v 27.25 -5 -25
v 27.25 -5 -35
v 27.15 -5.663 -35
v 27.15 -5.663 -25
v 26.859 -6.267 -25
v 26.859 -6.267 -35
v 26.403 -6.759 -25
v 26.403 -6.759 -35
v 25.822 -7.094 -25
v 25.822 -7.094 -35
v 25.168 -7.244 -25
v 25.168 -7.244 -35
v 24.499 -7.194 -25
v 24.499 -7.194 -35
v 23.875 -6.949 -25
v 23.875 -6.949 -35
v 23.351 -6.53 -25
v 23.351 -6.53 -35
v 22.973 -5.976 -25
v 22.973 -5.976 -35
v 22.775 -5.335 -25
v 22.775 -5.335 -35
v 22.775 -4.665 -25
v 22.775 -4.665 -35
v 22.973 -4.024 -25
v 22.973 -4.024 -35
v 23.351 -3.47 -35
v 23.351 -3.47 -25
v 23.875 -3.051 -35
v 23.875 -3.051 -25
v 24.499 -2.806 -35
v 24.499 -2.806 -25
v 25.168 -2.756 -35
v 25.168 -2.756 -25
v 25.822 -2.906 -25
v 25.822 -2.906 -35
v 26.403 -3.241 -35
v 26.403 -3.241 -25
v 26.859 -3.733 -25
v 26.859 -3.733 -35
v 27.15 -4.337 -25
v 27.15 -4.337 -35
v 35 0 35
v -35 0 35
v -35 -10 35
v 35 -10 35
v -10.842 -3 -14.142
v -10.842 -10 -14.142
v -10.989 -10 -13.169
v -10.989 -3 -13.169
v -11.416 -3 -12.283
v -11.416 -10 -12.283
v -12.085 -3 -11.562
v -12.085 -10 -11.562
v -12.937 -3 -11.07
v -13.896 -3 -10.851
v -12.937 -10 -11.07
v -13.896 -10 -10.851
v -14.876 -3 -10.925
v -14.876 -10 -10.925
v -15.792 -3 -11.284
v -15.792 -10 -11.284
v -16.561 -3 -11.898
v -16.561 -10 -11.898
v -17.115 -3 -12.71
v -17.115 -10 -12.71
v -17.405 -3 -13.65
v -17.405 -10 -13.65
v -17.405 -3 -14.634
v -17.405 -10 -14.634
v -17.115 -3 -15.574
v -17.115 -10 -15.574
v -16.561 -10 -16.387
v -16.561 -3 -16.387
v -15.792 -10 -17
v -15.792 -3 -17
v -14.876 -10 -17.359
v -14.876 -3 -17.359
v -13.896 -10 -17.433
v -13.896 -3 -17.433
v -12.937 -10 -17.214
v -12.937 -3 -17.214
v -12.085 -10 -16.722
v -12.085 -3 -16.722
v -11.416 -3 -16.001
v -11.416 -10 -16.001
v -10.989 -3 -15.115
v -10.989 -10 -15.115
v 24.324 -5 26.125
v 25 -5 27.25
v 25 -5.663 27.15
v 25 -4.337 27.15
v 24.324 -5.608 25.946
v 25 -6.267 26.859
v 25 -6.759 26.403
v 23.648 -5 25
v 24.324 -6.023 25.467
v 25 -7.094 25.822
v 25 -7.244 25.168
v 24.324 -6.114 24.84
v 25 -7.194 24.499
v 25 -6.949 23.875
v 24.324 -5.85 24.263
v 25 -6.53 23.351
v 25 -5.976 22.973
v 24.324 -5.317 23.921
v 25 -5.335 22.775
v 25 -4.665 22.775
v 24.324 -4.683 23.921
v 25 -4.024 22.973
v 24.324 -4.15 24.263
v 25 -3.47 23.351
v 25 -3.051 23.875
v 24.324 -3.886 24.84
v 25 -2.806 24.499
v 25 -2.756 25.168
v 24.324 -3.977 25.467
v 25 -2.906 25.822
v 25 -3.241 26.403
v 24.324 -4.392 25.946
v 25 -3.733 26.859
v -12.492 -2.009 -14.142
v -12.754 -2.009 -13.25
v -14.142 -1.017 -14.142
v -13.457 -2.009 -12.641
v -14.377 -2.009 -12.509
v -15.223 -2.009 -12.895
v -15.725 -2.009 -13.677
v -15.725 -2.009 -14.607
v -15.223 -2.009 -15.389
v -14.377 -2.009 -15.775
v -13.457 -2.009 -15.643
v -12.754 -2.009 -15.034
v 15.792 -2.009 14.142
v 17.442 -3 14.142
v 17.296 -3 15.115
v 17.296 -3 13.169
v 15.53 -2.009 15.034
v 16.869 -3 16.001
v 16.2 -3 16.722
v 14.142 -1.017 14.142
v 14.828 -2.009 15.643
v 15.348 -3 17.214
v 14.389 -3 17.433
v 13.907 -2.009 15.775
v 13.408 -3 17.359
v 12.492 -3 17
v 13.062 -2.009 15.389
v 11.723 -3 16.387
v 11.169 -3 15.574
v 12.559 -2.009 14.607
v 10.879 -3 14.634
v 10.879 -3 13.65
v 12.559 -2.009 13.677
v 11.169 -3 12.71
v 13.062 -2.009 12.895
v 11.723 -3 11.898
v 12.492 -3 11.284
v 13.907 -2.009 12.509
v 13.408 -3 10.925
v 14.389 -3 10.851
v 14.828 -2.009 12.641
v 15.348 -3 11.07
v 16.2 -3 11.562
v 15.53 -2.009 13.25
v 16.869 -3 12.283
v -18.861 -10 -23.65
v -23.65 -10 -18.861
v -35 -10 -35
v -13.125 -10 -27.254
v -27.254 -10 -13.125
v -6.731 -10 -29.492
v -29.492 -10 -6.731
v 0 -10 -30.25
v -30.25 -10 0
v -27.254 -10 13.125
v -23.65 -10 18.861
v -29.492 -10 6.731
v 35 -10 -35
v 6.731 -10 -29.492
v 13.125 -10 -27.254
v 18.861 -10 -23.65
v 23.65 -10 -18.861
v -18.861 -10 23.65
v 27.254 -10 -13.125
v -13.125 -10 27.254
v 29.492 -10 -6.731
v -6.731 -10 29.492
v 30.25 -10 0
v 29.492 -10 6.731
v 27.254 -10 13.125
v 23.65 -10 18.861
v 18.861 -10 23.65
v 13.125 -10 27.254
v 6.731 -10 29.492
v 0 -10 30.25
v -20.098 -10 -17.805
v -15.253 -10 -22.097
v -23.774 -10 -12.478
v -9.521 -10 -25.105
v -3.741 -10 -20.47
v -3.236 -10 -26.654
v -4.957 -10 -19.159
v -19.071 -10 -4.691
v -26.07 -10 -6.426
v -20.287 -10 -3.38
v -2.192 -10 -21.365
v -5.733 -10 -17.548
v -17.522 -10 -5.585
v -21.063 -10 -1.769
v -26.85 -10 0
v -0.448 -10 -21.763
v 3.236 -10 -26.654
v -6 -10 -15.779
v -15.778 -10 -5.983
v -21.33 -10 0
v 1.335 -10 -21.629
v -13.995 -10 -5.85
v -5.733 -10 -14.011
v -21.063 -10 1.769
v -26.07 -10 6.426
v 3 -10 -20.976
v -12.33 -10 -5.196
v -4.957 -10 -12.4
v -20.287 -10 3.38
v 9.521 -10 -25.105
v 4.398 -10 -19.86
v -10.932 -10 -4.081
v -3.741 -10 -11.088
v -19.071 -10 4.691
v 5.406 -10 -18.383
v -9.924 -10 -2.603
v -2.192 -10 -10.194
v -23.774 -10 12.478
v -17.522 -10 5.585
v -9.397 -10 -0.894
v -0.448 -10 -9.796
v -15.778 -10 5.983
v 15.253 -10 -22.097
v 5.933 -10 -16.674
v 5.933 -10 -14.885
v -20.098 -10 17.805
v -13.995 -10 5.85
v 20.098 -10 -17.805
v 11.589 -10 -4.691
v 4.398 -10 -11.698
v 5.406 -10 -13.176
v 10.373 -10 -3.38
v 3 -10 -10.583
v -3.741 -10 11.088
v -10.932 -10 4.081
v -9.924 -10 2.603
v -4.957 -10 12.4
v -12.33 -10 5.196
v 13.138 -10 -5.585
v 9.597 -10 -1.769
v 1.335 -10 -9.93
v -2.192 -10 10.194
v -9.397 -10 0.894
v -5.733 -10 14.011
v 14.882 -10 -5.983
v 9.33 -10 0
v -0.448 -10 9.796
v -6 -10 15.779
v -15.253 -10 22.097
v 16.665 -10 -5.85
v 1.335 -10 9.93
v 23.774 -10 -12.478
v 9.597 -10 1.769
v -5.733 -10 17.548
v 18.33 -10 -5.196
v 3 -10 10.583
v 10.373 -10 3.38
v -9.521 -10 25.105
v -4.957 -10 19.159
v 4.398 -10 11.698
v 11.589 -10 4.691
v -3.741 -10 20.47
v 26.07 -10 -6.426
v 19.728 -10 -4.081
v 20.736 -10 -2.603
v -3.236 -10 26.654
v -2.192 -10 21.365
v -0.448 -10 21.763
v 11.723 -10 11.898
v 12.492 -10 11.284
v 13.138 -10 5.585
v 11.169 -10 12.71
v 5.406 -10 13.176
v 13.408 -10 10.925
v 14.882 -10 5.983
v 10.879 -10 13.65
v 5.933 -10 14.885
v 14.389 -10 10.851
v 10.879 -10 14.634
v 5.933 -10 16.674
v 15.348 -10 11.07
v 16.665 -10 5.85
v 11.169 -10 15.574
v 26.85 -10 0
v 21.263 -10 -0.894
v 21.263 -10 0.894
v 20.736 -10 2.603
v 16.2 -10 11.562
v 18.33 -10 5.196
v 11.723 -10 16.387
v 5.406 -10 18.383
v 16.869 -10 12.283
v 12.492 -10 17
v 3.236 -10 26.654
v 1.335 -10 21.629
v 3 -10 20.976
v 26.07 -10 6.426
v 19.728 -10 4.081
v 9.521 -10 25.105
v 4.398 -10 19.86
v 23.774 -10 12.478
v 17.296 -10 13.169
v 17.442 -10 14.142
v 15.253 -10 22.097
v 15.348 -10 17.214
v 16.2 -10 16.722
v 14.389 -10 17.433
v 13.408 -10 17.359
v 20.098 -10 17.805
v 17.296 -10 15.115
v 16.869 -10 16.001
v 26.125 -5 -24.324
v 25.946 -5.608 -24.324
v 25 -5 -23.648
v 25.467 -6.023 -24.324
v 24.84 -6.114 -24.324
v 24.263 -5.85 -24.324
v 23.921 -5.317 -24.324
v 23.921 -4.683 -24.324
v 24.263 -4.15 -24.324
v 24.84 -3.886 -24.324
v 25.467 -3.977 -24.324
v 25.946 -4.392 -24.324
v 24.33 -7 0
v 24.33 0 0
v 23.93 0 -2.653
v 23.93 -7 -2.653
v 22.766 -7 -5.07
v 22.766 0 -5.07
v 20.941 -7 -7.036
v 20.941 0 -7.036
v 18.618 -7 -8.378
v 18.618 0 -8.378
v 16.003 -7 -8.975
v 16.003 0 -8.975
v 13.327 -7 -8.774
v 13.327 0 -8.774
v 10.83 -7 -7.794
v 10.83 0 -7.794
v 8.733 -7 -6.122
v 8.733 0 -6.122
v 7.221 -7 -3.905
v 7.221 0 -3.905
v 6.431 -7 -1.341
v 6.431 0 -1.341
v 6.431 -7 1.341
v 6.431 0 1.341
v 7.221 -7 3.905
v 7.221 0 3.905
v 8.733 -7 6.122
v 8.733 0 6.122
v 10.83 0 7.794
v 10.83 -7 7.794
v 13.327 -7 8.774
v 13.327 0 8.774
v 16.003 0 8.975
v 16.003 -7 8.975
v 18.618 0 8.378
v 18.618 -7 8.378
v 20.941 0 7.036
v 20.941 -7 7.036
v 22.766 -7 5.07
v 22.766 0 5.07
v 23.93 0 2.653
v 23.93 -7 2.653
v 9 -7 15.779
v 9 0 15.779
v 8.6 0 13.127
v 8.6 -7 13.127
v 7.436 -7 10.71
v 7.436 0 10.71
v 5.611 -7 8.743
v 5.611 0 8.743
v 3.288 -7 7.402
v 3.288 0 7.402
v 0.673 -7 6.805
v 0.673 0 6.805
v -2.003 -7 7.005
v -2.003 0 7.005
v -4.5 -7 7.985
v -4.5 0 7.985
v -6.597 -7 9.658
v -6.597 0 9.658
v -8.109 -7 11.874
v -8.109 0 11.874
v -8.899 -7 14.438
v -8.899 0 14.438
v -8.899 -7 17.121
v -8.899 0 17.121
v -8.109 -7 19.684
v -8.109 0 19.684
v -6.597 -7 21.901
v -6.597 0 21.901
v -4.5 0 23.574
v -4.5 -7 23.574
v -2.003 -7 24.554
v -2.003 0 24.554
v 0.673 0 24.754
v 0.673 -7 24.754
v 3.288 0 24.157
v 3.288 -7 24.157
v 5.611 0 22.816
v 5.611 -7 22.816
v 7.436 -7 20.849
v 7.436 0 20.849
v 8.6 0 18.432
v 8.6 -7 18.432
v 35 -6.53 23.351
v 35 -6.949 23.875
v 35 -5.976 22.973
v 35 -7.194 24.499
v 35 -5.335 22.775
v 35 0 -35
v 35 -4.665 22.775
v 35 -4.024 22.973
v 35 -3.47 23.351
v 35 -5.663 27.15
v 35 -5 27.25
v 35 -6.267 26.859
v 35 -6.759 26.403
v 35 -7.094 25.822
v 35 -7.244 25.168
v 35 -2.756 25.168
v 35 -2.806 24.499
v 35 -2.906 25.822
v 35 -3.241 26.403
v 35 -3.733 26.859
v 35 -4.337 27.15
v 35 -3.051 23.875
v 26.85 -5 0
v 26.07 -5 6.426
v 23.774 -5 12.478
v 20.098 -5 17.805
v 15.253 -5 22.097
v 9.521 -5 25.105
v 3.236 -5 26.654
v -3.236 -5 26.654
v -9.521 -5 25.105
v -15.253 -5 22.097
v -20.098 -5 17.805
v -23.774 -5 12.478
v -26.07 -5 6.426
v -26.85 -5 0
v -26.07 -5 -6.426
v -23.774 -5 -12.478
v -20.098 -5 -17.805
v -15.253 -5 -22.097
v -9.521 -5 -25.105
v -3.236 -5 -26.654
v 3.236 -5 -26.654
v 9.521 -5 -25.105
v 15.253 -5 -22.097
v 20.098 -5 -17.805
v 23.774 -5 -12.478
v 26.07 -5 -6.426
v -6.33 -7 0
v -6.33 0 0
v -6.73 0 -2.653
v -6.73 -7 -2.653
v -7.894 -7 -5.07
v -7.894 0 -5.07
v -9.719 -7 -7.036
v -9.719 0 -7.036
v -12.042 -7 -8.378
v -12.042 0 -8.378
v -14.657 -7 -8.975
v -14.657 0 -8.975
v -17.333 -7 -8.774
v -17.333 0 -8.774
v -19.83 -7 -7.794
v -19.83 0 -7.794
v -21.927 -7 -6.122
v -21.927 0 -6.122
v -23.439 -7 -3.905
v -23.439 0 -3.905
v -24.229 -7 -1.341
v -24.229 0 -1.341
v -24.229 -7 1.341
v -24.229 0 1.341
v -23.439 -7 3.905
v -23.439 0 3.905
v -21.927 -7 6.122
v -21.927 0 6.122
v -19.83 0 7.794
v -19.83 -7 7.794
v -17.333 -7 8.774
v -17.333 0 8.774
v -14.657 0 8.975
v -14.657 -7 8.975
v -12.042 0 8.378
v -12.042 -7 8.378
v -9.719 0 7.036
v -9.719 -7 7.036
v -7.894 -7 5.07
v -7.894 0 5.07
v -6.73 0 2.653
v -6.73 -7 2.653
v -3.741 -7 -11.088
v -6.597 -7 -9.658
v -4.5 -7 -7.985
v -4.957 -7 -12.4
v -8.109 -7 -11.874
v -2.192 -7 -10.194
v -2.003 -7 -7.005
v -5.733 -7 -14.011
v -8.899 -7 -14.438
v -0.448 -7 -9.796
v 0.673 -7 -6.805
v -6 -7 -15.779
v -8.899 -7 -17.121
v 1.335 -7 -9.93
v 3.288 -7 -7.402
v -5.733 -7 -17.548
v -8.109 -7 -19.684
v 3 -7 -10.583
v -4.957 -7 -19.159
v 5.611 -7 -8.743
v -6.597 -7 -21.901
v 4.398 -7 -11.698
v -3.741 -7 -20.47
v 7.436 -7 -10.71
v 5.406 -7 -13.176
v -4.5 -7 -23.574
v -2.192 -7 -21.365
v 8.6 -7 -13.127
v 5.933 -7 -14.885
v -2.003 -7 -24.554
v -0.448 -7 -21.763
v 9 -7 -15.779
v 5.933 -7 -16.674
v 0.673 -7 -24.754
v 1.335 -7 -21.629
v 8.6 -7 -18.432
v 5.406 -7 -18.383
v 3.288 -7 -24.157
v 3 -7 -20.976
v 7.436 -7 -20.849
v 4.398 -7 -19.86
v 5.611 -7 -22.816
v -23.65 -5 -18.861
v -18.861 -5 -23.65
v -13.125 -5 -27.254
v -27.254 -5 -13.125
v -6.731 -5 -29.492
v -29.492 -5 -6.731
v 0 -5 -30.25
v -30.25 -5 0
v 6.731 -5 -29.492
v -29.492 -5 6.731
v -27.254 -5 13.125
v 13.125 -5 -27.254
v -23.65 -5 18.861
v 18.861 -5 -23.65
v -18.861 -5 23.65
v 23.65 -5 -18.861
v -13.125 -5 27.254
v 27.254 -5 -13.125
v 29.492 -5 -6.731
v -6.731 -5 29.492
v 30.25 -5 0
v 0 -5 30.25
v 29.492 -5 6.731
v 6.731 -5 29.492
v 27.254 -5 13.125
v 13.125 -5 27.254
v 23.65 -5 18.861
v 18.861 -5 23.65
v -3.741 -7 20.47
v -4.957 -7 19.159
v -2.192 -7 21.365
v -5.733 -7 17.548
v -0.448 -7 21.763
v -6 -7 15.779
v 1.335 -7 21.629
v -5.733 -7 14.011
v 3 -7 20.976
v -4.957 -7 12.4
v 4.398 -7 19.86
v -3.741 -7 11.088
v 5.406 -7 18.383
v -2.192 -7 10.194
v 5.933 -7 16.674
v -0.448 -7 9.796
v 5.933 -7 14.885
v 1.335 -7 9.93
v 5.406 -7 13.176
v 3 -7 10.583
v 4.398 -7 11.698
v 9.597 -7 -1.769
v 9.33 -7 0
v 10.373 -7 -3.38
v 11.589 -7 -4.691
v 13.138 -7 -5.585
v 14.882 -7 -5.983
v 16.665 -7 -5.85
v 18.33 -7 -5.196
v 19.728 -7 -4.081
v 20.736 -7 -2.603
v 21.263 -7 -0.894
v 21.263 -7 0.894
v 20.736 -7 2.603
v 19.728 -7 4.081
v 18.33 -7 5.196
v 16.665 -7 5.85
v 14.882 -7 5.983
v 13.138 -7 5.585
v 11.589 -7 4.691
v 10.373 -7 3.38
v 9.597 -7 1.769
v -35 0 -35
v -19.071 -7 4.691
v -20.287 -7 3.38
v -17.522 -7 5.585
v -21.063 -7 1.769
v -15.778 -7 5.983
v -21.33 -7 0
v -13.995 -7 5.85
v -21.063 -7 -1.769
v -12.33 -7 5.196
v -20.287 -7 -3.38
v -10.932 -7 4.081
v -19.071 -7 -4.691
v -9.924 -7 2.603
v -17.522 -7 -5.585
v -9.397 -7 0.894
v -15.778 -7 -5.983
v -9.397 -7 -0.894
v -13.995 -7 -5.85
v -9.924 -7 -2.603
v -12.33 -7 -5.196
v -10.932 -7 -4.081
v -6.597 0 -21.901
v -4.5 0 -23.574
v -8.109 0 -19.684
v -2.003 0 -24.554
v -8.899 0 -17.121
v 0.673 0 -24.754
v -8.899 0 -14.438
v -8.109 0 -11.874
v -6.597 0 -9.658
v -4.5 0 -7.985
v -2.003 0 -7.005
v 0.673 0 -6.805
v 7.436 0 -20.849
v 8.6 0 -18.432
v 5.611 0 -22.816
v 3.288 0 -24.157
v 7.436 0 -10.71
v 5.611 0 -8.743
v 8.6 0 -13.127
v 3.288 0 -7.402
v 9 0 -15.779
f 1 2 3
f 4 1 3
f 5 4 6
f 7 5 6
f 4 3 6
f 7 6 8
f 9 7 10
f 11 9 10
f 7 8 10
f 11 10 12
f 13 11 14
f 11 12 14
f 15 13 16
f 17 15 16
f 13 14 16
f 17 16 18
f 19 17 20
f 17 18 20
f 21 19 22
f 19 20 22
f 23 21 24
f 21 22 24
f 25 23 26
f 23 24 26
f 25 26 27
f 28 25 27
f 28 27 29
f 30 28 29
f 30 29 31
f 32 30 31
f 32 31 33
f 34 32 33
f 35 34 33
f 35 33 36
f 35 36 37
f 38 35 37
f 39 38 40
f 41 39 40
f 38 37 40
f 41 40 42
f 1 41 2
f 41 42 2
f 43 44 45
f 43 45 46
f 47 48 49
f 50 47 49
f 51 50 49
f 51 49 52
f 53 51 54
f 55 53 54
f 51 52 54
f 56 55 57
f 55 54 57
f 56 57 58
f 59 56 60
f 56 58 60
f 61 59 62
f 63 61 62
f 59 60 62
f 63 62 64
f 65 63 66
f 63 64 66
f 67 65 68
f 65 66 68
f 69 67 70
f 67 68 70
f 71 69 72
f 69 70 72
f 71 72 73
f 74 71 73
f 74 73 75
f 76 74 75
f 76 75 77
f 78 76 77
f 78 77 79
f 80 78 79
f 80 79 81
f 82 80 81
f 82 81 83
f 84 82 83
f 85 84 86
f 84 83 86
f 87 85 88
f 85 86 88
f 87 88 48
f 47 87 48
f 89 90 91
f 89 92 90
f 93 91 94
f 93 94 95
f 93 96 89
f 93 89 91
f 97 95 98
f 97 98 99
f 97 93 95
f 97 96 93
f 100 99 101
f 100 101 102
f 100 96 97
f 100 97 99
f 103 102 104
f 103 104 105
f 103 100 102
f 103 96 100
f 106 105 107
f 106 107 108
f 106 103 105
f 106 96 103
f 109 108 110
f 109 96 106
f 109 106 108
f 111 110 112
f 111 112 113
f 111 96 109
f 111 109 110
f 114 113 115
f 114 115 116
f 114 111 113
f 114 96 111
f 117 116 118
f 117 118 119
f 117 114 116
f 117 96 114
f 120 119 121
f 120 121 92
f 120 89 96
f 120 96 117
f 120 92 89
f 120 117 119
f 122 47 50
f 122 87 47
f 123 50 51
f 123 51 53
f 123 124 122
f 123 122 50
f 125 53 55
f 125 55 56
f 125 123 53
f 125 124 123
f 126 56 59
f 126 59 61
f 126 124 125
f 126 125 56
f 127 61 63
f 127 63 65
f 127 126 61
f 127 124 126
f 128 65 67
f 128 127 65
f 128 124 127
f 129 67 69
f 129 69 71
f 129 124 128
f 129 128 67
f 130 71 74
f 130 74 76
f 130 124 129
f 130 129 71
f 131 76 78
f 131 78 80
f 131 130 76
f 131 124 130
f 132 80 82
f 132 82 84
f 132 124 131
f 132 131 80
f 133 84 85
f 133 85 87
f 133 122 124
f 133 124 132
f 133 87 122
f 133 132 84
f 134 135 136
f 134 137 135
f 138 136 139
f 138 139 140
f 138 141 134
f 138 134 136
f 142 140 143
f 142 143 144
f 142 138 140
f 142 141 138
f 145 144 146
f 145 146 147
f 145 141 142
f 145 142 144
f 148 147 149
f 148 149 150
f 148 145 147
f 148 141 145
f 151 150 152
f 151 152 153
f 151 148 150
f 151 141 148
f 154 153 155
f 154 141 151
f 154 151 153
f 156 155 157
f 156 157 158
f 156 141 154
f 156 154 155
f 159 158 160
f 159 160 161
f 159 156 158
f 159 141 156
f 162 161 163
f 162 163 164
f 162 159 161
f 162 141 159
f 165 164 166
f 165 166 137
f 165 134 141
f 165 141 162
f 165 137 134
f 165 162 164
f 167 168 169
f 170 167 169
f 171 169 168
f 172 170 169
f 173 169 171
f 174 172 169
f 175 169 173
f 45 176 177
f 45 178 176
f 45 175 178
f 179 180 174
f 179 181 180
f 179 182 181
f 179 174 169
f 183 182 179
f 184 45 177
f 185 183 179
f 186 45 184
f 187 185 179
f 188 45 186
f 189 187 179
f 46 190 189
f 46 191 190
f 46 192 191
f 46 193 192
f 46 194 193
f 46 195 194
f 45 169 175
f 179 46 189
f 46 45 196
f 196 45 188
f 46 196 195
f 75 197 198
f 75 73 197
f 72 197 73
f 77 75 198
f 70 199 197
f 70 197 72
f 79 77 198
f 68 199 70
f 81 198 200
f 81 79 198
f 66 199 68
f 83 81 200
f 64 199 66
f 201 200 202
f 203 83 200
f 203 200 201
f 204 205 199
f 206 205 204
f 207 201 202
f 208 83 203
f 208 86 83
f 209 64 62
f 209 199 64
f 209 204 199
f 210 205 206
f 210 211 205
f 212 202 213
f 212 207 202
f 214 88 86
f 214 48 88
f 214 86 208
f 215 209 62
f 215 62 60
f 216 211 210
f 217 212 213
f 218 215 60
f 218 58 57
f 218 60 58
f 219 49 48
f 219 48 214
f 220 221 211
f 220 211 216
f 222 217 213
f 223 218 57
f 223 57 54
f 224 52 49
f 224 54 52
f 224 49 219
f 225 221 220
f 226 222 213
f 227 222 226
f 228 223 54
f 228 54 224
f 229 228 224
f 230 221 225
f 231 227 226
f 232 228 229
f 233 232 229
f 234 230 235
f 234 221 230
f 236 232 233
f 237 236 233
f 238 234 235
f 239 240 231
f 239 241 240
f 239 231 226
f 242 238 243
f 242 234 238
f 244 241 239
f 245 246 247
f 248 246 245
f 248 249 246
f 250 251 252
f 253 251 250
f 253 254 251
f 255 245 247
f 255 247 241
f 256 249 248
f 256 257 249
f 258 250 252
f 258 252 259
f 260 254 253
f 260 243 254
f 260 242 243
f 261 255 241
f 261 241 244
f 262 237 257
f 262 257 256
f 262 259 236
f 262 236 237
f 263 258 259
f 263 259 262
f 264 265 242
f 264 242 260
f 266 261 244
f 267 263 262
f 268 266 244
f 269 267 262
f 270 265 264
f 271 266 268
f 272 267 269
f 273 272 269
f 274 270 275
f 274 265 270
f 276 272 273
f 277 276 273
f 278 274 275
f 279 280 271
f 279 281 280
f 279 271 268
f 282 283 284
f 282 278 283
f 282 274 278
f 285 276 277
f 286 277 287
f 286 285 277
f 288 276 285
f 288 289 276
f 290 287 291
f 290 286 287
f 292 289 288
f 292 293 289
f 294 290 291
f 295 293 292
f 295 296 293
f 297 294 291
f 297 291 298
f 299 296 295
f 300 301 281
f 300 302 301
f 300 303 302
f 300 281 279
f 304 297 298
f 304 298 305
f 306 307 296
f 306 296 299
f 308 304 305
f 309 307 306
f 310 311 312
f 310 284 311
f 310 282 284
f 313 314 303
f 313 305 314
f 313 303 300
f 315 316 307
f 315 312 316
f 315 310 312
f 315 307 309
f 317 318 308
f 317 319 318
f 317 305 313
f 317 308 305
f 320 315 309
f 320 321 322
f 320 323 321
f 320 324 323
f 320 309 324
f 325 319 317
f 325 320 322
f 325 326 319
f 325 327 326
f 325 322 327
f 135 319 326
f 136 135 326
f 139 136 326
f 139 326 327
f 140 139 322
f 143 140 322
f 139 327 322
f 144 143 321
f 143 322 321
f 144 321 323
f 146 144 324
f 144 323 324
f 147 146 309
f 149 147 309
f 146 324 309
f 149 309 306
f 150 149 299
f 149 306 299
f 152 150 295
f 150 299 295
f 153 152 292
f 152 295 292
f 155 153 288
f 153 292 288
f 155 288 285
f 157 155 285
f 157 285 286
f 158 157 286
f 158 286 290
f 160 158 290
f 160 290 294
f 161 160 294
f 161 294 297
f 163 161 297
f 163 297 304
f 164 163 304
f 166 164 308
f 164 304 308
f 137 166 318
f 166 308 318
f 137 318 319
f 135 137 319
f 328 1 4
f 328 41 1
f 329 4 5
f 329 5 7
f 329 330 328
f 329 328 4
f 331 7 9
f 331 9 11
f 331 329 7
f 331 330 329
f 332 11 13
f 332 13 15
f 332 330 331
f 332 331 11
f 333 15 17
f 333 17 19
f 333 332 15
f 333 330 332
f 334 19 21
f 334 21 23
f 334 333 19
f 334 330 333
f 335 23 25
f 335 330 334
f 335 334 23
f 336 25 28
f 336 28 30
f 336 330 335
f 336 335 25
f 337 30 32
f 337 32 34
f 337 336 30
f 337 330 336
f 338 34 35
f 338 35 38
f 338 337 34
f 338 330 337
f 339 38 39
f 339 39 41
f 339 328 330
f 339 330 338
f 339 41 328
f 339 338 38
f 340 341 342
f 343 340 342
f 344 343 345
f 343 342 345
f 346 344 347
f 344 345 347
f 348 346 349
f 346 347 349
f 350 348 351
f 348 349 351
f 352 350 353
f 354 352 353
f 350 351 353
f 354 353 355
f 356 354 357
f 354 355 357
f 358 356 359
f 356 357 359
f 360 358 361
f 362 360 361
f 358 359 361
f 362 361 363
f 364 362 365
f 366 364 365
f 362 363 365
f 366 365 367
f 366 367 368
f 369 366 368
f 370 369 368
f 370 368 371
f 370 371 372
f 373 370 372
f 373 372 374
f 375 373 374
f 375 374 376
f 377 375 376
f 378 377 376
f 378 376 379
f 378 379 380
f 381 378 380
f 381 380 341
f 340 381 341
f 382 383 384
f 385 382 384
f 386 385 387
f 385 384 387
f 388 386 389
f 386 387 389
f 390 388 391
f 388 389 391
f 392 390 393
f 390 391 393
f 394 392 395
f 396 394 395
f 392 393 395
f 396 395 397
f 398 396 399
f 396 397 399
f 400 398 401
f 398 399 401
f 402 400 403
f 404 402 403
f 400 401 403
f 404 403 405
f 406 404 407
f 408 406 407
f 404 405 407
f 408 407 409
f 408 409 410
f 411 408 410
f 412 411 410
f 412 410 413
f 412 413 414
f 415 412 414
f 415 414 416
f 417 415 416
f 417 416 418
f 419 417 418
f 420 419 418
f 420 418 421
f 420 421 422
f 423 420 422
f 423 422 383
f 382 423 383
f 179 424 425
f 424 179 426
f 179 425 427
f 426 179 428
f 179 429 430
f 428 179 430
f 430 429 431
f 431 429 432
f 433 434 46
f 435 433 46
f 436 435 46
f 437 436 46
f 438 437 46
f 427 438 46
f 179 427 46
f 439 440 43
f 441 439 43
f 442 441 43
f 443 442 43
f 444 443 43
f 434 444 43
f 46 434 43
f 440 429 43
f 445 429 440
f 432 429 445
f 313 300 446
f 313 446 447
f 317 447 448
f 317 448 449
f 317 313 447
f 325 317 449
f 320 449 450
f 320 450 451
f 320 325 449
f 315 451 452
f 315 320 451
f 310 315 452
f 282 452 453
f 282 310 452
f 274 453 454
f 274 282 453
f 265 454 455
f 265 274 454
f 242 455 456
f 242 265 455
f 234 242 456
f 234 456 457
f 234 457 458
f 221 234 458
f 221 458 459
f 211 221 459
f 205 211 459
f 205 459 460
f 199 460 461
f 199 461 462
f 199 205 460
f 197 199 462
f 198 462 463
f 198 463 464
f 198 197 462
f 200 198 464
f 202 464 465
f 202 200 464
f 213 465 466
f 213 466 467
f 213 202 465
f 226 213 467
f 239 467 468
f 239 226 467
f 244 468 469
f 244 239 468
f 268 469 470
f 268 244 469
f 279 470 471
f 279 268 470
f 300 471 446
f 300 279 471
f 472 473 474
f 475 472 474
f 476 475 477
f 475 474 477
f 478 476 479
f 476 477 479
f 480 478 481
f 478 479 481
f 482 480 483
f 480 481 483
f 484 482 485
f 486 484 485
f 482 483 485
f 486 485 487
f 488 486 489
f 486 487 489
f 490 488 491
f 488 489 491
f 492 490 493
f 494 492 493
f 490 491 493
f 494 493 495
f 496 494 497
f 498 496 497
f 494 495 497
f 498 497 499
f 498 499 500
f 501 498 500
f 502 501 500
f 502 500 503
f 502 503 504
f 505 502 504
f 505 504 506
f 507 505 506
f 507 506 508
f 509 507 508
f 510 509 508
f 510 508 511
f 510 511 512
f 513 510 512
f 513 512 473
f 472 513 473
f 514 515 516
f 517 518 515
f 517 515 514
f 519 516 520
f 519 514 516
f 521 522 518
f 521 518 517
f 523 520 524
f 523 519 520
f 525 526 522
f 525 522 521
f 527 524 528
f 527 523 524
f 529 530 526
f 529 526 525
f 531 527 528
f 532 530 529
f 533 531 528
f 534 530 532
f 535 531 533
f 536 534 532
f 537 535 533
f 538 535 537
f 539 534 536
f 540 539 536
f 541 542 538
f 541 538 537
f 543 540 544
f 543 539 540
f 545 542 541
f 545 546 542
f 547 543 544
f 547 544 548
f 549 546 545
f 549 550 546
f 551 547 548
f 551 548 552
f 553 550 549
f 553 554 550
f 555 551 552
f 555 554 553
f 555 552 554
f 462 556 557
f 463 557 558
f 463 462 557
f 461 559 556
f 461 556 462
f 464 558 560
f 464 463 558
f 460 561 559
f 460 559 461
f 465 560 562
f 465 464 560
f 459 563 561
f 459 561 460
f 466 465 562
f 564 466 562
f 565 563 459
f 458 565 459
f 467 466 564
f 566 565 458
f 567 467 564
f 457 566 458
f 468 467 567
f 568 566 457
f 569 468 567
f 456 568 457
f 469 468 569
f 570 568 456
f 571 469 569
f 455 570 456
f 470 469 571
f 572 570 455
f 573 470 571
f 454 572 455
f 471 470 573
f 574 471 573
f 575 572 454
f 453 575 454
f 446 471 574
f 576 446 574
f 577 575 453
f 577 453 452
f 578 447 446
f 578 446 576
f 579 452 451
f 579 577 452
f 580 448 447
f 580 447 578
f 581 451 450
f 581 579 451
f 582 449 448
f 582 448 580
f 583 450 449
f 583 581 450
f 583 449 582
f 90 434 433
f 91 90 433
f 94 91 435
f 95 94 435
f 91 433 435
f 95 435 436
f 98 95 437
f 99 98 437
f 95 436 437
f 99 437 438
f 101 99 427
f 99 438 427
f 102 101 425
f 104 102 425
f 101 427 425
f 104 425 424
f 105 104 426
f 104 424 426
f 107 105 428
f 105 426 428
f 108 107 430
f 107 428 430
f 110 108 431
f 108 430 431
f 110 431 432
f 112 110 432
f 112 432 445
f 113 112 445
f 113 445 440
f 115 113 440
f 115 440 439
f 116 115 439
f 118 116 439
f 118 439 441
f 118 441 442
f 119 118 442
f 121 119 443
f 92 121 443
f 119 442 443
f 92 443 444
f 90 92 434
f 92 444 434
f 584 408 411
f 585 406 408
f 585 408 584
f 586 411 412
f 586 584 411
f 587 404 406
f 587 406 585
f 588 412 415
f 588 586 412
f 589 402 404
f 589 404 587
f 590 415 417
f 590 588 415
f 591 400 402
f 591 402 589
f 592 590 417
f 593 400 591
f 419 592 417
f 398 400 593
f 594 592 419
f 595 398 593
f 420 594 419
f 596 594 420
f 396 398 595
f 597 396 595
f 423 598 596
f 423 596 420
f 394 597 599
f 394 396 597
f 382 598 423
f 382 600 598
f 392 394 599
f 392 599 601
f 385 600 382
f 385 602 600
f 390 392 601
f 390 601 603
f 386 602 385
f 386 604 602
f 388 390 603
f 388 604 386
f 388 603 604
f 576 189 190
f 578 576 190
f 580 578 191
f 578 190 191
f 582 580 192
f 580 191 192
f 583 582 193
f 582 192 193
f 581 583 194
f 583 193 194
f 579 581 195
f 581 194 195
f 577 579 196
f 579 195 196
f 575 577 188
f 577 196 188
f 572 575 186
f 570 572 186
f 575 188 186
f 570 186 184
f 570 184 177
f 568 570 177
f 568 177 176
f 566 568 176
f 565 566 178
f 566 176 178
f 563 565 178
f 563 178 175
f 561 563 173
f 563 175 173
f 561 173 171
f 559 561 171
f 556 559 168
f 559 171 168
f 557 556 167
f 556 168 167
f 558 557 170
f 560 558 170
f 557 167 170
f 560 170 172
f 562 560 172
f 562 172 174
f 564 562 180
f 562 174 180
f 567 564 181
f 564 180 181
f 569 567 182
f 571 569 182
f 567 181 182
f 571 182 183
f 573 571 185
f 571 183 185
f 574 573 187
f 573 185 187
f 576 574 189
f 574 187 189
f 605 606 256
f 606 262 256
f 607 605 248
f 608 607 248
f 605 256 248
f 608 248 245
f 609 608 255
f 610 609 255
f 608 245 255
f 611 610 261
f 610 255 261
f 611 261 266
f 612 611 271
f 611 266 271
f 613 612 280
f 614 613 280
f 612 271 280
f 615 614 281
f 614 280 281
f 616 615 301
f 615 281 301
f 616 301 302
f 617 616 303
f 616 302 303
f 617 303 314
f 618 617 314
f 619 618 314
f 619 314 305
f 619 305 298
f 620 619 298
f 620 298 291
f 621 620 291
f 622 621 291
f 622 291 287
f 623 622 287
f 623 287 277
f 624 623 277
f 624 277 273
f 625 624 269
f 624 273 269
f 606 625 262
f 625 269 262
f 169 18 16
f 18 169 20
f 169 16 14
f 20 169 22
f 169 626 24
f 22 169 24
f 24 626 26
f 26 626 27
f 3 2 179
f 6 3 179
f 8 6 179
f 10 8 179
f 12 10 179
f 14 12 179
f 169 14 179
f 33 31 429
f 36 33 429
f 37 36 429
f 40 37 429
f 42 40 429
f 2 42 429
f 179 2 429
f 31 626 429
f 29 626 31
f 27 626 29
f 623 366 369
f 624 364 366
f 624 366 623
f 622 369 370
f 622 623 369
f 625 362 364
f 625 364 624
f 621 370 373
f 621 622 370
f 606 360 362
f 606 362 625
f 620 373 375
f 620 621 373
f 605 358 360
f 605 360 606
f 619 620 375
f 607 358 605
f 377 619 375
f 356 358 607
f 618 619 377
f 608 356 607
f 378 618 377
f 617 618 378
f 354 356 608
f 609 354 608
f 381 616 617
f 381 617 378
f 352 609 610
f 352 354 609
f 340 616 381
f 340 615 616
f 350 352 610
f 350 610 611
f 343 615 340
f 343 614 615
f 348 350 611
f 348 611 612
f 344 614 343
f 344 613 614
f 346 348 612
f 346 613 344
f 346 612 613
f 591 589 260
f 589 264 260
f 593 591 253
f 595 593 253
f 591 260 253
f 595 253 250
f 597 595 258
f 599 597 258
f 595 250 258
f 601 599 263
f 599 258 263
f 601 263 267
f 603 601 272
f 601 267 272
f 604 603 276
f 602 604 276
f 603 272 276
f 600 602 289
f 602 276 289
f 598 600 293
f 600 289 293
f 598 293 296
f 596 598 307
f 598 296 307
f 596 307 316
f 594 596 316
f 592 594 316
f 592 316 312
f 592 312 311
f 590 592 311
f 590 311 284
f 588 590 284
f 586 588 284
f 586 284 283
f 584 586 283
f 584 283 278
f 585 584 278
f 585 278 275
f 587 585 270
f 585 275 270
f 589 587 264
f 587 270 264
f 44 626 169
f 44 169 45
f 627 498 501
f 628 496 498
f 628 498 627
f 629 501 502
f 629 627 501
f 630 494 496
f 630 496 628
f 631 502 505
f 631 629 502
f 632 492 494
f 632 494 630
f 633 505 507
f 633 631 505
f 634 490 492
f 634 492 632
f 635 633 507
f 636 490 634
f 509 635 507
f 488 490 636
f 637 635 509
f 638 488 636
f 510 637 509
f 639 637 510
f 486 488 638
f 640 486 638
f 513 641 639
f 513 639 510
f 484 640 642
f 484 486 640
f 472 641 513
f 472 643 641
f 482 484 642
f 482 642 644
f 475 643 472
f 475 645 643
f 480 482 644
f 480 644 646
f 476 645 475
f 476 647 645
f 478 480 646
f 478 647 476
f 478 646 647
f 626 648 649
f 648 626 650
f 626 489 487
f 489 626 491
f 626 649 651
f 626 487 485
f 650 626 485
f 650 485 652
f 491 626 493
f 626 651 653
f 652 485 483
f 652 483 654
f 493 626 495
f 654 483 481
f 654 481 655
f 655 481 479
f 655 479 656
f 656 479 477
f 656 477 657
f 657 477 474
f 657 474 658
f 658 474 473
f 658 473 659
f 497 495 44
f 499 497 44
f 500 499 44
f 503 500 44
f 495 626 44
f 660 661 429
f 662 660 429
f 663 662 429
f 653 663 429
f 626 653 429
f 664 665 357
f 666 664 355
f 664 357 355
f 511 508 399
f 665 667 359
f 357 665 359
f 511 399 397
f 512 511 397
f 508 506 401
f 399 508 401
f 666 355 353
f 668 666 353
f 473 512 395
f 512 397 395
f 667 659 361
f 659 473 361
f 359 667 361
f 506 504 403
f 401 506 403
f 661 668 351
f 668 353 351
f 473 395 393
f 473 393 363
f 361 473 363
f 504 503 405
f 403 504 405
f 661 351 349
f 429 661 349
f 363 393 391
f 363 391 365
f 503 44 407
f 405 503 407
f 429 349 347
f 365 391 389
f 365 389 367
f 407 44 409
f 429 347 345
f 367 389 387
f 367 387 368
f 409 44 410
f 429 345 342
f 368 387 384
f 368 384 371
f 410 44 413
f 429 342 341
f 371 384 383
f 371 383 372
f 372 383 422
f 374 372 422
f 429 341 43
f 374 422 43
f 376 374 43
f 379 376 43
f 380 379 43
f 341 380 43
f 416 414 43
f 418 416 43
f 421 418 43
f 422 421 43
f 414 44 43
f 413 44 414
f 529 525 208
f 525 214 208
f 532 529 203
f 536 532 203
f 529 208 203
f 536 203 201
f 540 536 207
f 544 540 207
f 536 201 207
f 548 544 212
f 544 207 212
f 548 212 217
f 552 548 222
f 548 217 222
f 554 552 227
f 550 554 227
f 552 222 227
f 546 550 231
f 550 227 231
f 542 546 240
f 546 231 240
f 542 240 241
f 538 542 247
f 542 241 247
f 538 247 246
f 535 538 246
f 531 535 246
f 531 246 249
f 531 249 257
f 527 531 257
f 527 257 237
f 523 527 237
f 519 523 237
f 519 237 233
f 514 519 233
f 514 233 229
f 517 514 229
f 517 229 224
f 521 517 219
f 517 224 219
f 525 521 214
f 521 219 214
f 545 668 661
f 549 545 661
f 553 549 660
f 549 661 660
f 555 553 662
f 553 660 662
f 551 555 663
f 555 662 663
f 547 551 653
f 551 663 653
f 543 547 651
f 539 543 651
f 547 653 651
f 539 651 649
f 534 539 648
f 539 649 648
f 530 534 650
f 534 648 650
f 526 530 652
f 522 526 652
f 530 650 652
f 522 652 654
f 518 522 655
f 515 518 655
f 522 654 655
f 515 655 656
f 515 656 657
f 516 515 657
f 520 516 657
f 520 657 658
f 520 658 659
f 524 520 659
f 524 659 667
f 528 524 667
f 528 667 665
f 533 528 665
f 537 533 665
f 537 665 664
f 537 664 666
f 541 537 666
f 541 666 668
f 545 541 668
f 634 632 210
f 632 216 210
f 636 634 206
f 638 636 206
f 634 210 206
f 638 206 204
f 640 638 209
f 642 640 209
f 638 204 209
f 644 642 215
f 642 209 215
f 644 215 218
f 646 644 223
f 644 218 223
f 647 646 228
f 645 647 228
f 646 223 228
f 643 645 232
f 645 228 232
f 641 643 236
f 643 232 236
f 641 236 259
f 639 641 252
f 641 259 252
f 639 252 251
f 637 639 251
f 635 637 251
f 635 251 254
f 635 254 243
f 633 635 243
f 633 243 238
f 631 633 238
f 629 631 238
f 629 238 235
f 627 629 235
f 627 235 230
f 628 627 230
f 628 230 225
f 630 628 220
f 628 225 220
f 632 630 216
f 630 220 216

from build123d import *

# Parameters (mm, degrees)
SKETCH_W            = 70
SKETCH_H            = 70
PAD_DEPTH           = 10
SKETCH001_R         = 30.25
SKETCH001_R_2       = 26.85
POCKET_DEPTH        = 5
SKETCH003_R         = 2.25
HOLE_DEPTH          = 10
HOLE_TIPS_R         = 2.25
SKETCH004_R         = 2.25
HOLE001_DEPTH       = 10
HOLE001_TIPS_R      = 2.25
HOLE002_D           = 12
HOLE002_CBORE_D     = 18
HOLE002_CBORE_DEPTH = 7
SKETCH007_R         = 3.3
HOLE003_DEPTH       = 7
HOLE003_TIPS_R      = 3.3


with BuildPart() as part:
    # Sketch → Pad (new body)
    with BuildSketch(Plane.XZ):
        Rectangle(SKETCH_W, SKETCH_H)
    extrude(amount=PAD_DEPTH)

    # Sketch001 (on Face6 of Pad) → Pocket (cut)
    with BuildSketch(Plane.XZ.offset(10)):
        Circle(SKETCH001_R)
        Circle(SKETCH001_R_2, mode=Mode.SUBTRACT)
    extrude(amount=-POCKET_DEPTH, mode=Mode.SUBTRACT)

    # Sketch003 (on Face3 of Pocket) → Hole (cut)
    with BuildSketch(Plane(origin=(35, 0, 0), x_dir=(0, 0, 1), z_dir=(1, 0, 0))):
        with Locations((25, 5)):
            Circle(SKETCH003_R)
    extrude(amount=-HOLE_DEPTH, mode=Mode.SUBTRACT)

    # Hole tips → Hole tip 1 section 0
    with BuildSketch(Plane(origin=(25, 0, 0), x_dir=(0, 0, 1), z_dir=(1, 0, 0)), mode=Mode.PRIVATE) as hole_tip_1_s0:
        with Locations((25, 5)):
            Circle(HOLE_TIPS_R)
    loft([hole_tip_1_s0.sketch, Vertex(23.648064, -5, 25)], mode=Mode.SUBTRACT)

    # Sketch004 (on Face6 of Hole) → Hole001 (cut)
    with BuildSketch(Plane(origin=(0, 0, -35), x_dir=(1, 0, 0), z_dir=(0, 0, -1))):
        with Locations((25, 5)):
            Circle(SKETCH004_R)
    extrude(amount=-HOLE001_DEPTH, mode=Mode.SUBTRACT)

    # Hole001 tips → Hole001 tip 1 section 0
    with BuildSketch(Plane(origin=(0, 0, -25), x_dir=(1, 0, 0), z_dir=(0, 0, -1)), mode=Mode.PRIVATE) as hole001_tip_1_s0:
        with Locations((25, 5)):
            Circle(HOLE001_TIPS_R)
    loft([hole001_tip_1_s0.sketch, Vertex(25, -5, -23.648064)], mode=Mode.SUBTRACT)

    # Hole002 (through all)
    with Locations(Plane(origin=(0, 0, 0), x_dir=(1, 0, 0), z_dir=(0, 1, 0))):
        with Locations((15.33, 0), (0, -15.779452), (0, 15.779452), (-15.33, 0)):
            CounterBoreHole(HOLE002_D / 2, HOLE002_CBORE_D / 2, HOLE002_CBORE_DEPTH)

    # Sketch007 (on Face5 of Hole002) → Hole003 (cut)
    with BuildSketch(Plane.XZ.offset(10)):
        with Locations((14.142136, 14.142136)):
            Circle(SKETCH007_R)
        with Locations((-14.142136, -14.142136)):
            Circle(SKETCH007_R)
    extrude(amount=-HOLE003_DEPTH, mode=Mode.SUBTRACT)

    # Hole003 tips → Hole003 tip 1 section 0
    with BuildSketch(Plane.XZ.offset(3), mode=Mode.PRIVATE) as hole003_tip_1_s0:
        with Locations((14.142136, 14.142136)):
            Circle(HOLE003_TIPS_R)
    loft([hole003_tip_1_s0.sketch, Vertex(14.142136, -1.01716, 14.142136)], mode=Mode.SUBTRACT)

    # Hole003 tips → Hole003 tip 2 section 0
    with BuildSketch(Plane.XZ.offset(3), mode=Mode.PRIVATE) as hole003_tip_2_s0:
        with Locations((-14.142136, -14.142136)):
            Circle(HOLE003_TIPS_R)
    loft([hole003_tip_2_s0.sketch, Vertex(-14.142136, -1.01716, -14.142136)], mode=Mode.SUBTRACT)


solid = part.part
